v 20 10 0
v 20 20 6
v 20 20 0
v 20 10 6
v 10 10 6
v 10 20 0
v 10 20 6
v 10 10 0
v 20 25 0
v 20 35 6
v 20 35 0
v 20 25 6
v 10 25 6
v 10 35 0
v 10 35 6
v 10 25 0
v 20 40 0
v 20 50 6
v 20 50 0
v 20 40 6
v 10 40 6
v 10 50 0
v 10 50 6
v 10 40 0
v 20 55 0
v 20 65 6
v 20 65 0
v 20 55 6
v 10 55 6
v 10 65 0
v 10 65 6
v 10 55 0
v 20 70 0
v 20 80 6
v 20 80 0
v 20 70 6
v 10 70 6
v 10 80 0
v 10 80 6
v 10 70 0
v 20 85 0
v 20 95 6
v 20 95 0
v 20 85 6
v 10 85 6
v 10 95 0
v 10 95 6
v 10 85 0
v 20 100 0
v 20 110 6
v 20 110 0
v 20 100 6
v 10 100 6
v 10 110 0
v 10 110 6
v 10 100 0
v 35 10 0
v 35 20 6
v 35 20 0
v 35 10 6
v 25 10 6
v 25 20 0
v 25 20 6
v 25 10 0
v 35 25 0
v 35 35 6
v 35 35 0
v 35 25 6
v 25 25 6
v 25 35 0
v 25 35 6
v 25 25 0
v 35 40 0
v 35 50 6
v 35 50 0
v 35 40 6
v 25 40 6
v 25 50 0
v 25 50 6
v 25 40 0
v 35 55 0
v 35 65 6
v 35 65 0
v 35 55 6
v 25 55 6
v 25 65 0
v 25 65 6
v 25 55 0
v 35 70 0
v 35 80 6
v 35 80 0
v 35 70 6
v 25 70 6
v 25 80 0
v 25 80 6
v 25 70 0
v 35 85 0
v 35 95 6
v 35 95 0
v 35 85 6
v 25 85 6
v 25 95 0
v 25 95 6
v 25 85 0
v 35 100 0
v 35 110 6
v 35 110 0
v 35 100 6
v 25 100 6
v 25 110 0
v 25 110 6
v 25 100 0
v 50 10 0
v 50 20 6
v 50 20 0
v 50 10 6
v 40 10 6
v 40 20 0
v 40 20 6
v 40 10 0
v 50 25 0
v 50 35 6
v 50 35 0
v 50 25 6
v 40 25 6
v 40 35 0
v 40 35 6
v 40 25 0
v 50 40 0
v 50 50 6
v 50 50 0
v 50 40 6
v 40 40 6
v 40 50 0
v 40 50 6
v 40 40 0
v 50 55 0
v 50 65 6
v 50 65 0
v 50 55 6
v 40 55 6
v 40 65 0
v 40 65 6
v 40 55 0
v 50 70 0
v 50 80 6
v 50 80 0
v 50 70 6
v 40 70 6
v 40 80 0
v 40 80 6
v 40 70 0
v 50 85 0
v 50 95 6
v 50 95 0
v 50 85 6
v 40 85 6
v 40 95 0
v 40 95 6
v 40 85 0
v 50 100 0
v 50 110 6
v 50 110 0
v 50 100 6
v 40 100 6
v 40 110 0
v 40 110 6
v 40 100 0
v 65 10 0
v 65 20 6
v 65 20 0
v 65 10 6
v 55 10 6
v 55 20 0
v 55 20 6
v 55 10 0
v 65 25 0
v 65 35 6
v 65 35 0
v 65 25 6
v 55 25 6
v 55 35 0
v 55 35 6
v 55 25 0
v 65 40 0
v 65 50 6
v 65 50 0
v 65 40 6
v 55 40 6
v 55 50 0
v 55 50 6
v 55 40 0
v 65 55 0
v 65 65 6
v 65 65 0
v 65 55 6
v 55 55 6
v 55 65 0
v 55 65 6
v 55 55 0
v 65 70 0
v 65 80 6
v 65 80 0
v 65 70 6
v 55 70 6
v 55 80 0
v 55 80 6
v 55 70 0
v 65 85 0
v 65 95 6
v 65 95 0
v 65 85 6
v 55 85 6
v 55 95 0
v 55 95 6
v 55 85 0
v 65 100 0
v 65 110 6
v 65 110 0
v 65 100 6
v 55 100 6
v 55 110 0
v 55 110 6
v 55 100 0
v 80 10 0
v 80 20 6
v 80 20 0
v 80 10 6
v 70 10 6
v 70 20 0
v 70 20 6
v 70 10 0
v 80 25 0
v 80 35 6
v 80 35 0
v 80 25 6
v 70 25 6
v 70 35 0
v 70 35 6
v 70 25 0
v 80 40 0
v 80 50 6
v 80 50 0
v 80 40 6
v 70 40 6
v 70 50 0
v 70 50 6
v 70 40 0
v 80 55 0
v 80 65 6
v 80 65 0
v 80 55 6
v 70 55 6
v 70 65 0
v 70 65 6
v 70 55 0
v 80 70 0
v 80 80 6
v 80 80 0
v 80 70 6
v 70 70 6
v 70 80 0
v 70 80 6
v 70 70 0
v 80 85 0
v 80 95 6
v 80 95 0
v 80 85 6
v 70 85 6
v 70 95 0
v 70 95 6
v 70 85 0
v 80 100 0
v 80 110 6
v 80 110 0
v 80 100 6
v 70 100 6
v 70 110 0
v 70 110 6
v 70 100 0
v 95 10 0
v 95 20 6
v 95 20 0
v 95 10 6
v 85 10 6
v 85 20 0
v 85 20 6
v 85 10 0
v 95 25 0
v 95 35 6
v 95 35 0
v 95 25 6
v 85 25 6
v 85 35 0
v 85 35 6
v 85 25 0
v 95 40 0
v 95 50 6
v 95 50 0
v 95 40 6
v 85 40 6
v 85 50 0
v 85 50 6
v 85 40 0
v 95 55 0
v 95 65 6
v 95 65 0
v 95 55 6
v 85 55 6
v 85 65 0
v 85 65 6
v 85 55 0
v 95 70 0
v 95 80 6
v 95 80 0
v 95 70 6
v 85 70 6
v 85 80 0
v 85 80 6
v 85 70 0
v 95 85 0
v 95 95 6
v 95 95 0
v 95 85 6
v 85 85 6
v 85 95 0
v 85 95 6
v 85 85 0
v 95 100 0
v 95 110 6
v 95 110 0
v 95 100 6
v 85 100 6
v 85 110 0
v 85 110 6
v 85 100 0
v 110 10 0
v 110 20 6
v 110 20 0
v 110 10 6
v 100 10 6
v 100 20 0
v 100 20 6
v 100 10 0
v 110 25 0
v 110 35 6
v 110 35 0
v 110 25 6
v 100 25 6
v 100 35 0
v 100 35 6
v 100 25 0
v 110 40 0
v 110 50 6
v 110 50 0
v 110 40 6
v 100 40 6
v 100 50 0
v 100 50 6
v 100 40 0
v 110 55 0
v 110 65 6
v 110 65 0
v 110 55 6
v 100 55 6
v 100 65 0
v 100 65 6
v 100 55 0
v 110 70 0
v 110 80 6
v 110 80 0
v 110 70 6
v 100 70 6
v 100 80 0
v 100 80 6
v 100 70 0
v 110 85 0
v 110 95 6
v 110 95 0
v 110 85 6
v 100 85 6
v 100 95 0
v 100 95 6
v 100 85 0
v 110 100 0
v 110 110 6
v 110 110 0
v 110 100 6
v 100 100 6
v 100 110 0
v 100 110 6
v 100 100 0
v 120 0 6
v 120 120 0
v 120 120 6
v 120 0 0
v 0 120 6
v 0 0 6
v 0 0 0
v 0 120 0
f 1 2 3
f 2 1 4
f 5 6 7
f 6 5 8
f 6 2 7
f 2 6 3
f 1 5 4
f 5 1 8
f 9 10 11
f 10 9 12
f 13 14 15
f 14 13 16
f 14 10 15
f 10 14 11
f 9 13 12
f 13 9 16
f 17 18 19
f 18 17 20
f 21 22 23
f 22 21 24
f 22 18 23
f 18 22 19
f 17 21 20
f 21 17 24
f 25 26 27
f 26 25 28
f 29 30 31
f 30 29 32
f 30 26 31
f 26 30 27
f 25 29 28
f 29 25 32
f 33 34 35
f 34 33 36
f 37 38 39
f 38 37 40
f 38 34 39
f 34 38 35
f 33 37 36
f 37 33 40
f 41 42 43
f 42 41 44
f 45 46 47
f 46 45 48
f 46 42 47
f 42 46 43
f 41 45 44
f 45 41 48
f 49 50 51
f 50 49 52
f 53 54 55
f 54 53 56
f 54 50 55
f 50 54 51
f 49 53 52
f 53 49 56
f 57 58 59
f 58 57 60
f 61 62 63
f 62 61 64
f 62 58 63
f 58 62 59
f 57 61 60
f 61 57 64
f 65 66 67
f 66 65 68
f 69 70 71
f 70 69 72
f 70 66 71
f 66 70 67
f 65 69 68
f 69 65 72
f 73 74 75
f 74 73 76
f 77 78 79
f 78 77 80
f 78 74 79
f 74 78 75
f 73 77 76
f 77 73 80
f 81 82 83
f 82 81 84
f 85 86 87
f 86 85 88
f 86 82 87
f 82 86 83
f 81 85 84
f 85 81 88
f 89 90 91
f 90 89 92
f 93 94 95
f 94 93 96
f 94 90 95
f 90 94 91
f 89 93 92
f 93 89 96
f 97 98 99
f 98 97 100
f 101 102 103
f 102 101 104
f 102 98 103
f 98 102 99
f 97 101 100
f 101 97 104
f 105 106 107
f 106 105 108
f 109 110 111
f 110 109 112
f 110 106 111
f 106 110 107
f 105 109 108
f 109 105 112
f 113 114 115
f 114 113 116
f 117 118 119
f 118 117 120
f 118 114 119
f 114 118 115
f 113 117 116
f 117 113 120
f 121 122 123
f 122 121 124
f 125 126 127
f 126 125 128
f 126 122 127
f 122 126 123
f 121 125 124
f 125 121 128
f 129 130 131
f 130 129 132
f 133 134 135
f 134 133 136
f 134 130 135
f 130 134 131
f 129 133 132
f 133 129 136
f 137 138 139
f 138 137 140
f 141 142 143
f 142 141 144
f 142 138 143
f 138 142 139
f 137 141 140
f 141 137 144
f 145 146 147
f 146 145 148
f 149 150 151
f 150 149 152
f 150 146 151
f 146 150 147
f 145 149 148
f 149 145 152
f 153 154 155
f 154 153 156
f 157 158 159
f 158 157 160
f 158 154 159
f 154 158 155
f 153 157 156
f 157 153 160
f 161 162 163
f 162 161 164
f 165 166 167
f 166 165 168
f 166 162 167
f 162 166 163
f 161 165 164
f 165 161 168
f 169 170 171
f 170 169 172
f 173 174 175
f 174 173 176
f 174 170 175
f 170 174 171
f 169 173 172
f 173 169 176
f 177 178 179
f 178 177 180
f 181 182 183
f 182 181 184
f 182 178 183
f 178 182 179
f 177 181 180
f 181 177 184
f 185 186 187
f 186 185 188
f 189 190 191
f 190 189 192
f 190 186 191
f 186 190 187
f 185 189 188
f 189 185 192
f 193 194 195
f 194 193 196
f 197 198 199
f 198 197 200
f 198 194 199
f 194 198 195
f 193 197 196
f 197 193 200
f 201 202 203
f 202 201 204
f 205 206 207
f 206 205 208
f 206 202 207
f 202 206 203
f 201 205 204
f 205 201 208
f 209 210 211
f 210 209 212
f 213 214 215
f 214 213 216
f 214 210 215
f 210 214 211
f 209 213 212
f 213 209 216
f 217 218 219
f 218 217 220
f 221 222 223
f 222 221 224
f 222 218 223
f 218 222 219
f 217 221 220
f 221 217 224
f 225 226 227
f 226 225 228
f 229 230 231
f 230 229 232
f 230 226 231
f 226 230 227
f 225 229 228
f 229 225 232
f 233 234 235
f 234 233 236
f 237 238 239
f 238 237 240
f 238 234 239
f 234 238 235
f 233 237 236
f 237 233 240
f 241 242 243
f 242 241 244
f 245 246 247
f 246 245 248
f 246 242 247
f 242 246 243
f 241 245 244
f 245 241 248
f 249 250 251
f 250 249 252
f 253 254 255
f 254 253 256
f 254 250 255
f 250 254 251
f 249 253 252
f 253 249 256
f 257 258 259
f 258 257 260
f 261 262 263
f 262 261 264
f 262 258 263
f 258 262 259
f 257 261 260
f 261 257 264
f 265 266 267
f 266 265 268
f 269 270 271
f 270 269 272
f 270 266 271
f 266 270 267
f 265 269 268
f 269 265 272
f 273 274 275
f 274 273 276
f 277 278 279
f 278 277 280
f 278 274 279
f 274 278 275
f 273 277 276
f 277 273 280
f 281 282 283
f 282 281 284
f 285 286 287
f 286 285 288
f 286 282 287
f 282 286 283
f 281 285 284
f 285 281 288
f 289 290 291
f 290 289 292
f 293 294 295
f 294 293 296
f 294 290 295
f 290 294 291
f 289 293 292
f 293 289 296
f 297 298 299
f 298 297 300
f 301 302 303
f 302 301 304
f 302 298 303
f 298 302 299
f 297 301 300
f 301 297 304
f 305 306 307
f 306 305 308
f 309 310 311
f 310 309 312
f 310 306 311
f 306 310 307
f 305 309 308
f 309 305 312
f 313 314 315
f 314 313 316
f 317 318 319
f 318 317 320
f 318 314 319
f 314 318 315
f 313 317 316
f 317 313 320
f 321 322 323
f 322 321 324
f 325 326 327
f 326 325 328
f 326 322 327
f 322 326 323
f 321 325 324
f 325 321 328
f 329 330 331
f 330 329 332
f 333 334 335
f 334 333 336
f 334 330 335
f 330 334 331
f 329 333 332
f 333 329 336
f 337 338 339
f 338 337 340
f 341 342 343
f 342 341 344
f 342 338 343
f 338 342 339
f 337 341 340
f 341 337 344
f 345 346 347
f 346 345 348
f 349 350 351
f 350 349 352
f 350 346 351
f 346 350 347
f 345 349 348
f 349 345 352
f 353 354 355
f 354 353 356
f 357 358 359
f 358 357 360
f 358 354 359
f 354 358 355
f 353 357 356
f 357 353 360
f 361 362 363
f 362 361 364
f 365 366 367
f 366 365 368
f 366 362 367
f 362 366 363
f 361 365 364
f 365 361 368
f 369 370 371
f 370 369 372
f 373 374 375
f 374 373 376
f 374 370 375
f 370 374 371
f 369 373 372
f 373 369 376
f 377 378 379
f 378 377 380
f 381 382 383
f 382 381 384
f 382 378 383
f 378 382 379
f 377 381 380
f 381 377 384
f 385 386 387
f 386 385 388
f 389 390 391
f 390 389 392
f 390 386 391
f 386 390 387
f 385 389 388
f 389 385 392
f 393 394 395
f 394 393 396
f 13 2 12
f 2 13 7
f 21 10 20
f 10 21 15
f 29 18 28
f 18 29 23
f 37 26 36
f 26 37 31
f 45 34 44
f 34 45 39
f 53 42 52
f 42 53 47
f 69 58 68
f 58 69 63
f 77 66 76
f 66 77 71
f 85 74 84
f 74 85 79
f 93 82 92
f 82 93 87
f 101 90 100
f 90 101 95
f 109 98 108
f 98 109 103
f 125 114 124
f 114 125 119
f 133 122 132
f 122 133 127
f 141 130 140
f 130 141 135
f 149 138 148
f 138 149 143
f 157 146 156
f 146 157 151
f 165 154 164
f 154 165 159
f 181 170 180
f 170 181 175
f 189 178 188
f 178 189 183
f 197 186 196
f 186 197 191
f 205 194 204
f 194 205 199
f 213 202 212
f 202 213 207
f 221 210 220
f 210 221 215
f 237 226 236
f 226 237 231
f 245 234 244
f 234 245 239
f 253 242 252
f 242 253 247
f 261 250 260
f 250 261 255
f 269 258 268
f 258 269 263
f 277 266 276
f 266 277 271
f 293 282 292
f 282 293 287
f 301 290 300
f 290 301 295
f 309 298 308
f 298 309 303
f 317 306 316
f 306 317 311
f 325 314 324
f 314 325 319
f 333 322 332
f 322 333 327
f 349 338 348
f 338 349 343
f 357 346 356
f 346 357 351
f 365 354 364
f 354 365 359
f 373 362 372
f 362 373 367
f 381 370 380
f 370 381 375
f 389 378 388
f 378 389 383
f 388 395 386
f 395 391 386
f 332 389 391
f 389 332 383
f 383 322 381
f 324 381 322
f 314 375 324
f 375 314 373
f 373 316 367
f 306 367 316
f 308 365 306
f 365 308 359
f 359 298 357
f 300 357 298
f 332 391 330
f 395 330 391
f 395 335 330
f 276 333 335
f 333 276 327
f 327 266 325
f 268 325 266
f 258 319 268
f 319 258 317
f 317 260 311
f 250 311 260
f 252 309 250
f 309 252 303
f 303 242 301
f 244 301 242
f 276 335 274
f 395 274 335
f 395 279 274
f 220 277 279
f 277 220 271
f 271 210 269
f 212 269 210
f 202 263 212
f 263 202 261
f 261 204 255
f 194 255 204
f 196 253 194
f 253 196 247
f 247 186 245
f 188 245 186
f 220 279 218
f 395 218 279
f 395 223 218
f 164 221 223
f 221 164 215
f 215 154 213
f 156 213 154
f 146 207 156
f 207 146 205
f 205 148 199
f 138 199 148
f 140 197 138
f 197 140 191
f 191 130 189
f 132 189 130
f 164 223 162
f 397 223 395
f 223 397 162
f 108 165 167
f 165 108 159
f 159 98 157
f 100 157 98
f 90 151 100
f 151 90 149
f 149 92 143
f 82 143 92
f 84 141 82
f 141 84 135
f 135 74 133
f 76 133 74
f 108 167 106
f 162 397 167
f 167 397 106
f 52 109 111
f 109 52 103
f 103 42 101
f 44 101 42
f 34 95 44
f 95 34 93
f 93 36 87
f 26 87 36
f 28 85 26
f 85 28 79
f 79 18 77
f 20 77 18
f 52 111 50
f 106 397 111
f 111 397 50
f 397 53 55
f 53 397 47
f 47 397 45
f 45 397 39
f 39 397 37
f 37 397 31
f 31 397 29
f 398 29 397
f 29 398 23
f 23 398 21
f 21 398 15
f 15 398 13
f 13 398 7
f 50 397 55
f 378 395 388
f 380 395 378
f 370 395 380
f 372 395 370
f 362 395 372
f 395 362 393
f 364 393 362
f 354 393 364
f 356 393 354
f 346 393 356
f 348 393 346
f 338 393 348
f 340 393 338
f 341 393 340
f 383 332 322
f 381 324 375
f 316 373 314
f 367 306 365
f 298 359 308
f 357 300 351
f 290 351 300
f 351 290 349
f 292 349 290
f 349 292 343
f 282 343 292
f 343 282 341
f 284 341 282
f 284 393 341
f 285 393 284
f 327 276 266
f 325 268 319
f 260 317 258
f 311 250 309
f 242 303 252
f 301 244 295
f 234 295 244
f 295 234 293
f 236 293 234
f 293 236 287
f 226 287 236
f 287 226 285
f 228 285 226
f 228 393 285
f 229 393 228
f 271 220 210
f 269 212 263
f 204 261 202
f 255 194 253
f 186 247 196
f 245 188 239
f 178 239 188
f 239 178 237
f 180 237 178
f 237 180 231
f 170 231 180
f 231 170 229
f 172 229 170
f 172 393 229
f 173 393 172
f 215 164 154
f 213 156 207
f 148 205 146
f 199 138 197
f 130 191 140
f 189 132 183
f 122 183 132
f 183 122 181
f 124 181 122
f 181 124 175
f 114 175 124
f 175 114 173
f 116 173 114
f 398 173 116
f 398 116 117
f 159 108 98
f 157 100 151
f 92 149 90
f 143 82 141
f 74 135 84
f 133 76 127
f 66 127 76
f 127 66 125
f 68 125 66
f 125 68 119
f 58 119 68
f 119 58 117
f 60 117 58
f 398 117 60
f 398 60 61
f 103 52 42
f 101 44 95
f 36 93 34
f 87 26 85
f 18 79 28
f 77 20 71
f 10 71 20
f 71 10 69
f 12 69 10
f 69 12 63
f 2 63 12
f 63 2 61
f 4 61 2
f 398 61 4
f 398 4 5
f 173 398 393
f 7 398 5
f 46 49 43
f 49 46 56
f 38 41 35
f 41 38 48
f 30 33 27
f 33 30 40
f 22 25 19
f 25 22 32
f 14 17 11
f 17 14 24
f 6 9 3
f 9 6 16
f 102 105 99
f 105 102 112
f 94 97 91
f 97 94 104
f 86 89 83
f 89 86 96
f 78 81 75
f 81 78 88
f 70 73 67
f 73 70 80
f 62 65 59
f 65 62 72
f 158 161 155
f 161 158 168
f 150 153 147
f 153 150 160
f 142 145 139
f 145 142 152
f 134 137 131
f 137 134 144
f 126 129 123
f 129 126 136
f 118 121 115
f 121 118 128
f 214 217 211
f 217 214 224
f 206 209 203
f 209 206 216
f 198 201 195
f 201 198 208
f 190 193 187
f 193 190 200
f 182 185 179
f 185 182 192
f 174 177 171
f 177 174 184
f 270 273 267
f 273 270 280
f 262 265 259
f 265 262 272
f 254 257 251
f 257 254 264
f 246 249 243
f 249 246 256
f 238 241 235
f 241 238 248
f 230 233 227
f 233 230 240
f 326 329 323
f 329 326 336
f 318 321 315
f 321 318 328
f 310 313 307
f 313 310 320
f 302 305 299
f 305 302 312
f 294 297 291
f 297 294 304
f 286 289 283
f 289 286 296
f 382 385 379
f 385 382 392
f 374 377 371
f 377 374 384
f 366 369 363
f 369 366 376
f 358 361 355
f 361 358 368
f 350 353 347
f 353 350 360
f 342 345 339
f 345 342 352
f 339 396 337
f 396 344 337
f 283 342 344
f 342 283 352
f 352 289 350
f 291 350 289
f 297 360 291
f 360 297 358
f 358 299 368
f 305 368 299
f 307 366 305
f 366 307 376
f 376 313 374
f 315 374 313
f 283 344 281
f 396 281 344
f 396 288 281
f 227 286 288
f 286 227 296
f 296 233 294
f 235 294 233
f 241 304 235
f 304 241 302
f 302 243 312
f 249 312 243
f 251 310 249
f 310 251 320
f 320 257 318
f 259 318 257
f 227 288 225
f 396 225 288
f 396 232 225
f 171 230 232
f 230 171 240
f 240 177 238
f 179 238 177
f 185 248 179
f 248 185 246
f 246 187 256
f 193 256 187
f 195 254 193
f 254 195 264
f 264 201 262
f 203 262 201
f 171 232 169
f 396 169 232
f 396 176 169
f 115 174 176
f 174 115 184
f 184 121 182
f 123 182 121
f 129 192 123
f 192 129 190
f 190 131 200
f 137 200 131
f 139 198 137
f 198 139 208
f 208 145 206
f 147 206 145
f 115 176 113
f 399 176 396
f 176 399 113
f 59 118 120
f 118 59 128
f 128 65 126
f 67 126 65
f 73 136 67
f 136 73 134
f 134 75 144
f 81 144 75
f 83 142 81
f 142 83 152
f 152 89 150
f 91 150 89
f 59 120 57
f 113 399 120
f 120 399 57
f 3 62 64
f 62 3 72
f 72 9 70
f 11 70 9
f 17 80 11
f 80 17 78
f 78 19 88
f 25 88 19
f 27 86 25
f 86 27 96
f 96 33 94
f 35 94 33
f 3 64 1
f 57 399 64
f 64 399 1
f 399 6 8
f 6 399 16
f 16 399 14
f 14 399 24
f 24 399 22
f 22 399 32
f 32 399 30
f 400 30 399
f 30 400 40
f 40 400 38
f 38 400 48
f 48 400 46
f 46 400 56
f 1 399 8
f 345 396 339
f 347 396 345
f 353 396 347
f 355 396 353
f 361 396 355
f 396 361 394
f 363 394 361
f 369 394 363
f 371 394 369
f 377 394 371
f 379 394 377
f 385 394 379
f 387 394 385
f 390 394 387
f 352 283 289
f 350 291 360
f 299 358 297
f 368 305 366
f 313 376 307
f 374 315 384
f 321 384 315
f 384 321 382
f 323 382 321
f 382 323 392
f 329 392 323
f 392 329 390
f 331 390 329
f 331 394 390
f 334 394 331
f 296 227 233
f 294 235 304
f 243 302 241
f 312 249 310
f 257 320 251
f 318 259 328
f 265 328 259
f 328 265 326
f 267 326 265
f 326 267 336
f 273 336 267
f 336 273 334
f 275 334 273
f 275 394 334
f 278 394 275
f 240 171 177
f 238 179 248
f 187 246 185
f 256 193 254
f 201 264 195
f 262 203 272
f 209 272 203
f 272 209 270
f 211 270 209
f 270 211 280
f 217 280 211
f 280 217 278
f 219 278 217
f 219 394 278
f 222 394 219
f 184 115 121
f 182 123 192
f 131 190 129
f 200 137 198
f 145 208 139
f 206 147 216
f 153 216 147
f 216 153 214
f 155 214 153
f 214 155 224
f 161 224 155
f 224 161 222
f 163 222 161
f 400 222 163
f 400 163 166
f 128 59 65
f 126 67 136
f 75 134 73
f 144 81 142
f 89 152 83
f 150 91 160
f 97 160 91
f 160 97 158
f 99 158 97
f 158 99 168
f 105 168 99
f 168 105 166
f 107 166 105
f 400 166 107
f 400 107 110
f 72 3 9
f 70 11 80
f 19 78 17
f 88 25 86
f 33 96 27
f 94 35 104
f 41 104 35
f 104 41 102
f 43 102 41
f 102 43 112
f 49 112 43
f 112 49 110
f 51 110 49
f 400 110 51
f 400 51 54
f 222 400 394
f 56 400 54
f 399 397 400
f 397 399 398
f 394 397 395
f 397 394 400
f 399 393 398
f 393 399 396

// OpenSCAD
w=120;
d=120;
h=6;
wh=10;
wh_gap=5;
count = w/(wh+wh_gap);
difference(){
    cube([w,d,h]);
    for (i = [0:count-2]){
        for (j = [0:count-2]){
            translate([10+(wh+wh_gap)*i,10+(wh+wh_gap)*j,-1])
            cube([wh,wh,h+2]);
        }
    }
}
